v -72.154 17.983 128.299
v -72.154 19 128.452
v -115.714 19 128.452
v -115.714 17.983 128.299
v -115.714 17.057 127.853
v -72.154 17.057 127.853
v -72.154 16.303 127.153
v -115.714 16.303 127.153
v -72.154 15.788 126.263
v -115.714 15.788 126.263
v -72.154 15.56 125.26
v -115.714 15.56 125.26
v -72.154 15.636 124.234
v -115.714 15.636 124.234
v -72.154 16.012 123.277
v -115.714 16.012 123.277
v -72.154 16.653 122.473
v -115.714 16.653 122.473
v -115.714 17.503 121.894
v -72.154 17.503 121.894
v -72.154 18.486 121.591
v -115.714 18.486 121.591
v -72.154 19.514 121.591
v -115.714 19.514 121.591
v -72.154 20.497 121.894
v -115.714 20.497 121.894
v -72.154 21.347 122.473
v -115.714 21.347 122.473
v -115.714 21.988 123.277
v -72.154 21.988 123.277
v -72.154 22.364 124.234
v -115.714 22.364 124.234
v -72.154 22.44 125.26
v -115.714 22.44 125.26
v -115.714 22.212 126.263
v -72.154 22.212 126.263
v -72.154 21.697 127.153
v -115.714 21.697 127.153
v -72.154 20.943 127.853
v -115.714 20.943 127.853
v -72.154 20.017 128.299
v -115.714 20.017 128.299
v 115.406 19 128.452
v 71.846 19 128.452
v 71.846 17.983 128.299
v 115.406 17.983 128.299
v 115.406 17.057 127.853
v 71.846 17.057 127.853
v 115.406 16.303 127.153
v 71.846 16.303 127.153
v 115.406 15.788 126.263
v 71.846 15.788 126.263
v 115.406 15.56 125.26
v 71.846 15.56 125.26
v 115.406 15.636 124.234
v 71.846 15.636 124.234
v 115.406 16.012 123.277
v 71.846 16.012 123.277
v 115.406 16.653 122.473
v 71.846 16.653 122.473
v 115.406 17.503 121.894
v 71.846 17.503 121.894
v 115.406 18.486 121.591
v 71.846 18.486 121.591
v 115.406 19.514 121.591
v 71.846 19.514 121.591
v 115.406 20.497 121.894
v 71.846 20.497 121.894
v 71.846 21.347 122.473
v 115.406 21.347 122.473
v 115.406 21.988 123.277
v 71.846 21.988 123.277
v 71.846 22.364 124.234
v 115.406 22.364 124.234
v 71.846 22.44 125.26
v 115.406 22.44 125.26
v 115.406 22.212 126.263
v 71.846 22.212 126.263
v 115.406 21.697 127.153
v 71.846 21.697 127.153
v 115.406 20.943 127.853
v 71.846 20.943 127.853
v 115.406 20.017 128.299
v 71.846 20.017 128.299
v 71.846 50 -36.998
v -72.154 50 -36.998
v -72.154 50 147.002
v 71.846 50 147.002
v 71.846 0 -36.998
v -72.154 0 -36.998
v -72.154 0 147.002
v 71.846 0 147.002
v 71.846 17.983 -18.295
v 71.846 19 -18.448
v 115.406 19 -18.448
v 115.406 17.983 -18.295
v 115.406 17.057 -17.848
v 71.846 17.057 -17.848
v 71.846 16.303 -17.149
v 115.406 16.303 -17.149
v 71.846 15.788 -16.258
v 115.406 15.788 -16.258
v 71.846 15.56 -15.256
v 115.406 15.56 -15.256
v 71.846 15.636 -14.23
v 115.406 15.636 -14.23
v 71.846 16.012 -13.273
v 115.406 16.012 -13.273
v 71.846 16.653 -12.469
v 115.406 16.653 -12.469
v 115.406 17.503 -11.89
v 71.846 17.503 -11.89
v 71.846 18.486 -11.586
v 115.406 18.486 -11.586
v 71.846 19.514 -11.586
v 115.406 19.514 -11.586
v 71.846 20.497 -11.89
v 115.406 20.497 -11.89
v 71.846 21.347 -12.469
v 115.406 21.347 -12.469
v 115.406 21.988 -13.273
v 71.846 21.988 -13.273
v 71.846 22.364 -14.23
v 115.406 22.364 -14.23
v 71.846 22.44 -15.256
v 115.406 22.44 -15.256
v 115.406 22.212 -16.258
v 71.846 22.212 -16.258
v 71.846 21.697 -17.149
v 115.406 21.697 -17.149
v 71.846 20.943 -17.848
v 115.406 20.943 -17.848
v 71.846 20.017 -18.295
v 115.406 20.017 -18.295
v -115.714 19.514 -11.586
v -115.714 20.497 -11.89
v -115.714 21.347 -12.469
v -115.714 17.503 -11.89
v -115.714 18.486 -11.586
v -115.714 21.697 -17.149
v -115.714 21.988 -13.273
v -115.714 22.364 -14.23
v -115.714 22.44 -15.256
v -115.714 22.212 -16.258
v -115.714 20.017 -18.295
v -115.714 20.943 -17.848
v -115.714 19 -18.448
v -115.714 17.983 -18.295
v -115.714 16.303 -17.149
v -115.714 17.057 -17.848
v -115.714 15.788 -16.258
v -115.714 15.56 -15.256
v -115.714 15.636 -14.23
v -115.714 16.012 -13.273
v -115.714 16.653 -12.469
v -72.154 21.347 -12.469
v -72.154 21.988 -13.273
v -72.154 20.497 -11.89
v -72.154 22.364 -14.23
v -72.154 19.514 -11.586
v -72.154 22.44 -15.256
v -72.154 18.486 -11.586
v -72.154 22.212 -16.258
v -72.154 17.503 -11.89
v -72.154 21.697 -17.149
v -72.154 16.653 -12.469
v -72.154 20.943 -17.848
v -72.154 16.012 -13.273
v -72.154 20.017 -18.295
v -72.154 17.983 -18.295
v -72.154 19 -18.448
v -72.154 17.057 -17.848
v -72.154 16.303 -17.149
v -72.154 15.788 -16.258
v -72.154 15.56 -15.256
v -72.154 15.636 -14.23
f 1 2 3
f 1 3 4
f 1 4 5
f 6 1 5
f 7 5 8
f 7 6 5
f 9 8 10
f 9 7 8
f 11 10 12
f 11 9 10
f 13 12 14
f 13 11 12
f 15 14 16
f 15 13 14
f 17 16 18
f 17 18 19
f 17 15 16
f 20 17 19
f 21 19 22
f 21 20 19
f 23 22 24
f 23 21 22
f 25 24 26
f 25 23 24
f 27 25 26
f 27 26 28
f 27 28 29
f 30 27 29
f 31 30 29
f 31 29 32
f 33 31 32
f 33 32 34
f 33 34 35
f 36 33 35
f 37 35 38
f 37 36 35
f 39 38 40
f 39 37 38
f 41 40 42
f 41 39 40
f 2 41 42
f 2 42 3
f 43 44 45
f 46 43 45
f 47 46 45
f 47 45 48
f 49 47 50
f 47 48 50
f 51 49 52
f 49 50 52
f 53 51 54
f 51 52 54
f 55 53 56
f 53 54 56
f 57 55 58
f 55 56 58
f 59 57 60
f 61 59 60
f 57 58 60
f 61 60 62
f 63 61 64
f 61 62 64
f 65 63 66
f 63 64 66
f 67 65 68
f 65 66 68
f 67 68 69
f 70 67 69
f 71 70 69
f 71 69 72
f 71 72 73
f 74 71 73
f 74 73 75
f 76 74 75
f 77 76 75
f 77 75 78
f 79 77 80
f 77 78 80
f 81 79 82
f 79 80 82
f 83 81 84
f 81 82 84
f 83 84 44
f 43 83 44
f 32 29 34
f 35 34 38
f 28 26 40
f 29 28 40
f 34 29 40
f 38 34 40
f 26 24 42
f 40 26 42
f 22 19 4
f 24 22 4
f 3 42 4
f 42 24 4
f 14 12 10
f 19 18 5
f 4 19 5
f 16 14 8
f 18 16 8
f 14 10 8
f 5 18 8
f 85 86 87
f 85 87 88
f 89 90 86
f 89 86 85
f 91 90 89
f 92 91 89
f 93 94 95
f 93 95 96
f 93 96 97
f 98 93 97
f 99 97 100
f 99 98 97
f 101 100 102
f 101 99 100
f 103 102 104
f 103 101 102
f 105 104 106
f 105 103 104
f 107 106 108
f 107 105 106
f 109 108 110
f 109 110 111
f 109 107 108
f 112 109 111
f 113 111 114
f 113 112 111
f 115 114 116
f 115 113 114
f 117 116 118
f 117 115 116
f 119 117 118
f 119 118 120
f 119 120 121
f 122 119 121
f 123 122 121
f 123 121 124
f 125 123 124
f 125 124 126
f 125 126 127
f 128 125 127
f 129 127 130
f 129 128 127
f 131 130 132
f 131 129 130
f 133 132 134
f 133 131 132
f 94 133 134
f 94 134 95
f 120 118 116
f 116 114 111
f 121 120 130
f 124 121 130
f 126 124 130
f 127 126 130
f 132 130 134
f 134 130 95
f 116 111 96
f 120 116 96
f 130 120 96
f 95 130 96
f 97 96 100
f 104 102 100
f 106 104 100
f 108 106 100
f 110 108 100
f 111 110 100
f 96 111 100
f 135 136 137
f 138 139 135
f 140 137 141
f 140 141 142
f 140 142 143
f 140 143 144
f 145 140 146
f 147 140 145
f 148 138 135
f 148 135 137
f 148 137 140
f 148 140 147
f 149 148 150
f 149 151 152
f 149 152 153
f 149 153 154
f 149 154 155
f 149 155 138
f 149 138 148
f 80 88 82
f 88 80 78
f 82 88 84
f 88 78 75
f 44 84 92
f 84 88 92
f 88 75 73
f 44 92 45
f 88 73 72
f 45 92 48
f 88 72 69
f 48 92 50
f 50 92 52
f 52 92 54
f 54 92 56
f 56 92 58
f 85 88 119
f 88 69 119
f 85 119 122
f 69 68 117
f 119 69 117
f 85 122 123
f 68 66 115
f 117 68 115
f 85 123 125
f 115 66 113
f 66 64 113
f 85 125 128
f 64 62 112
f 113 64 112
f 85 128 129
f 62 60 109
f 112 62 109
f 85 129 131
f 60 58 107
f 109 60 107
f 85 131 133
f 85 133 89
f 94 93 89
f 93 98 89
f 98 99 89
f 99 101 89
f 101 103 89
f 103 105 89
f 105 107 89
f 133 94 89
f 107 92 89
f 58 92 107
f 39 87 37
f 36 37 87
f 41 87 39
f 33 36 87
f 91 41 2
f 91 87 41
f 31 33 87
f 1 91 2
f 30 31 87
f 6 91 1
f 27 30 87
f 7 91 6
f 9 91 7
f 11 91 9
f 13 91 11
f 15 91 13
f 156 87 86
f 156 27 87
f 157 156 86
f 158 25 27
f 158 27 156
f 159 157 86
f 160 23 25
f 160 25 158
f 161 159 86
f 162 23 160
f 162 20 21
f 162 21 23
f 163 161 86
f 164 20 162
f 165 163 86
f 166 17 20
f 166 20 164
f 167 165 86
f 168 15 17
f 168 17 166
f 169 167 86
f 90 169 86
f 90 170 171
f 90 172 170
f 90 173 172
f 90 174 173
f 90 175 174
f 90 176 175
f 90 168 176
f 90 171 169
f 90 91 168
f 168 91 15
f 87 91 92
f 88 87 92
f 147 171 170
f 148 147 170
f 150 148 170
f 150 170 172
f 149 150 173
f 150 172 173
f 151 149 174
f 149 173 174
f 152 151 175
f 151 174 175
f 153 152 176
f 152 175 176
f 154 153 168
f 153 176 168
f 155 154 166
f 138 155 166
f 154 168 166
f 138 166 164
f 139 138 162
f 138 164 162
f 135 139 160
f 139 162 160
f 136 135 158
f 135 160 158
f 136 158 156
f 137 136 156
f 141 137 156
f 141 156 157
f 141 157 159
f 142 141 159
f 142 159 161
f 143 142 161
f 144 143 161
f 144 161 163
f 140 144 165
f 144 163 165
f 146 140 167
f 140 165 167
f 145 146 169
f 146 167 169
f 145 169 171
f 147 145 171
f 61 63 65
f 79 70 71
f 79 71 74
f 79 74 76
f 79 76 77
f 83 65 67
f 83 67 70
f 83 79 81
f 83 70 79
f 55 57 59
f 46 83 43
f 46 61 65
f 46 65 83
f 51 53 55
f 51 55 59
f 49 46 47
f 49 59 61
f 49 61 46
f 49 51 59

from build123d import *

# Parameters (mm, degrees)
SKETCH_1_W                                 = 144
SKETCH_1_H                                 = 184
EXTRUDE_1_DEPTH                            = 50
SKETCH_2_R                                 = 3.45
EXTRUDE_2_DEPTH                            = 43.56
MIRROR_1_AT_THE_SECOND_PLANE_COPY_1_SKET_R = 3.45
MIRROR_1_AT_THE_SECOND_PLANE_COPY_1_DEPTH  = 43.56


with BuildPart() as part:
    # 草图1 → 凸台-拉伸1 (new body)
    with BuildSketch(Plane(origin=(0, 0, 0), x_dir=(1, 0, 0), z_dir=(0, 1, 0))):
        with Locations((-0.153518124, -55.002132196)):
            Rectangle(SKETCH_1_W, SKETCH_1_H)
    extrude(amount=EXTRUDE_1_DEPTH)

    # 草图2 → 凸台-拉伸2 (add)
    with BuildSketch(Plane.ZY.offset(72.153518124)):
        with Locations((-14.997867804, 19)):
            Circle(SKETCH_2_R)
    extrude_2 = extrude(amount=EXTRUDE_2_DEPTH)

    # 镜向1: 凸台-拉伸2 across plane
    add(extrude_2.mirror(Plane.ZY.offset(0.153518124)))

    # 镜向1 at the second plane: 凸台-拉伸2 across plane
    add(extrude_2.mirror(Plane(origin=(0, 0, 55.002132196), x_dir=(1, 0, 0), z_dir=(0, 0, -1))))

    # 镜向1 at the second plane copy 1 sket → 镜向1 at the second plane copy 1 (add)
    with BuildSketch(Plane(origin=(71.846481876, 0, 110.004264392), x_dir=(0, 0, -1), z_dir=(1, 0, 0))):
        with Locations((-14.997867804, 19)):
            Circle(MIRROR_1_AT_THE_SECOND_PLANE_COPY_1_SKET_R)
    extrude(amount=MIRROR_1_AT_THE_SECOND_PLANE_COPY_1_DEPTH)


solid = part.part
